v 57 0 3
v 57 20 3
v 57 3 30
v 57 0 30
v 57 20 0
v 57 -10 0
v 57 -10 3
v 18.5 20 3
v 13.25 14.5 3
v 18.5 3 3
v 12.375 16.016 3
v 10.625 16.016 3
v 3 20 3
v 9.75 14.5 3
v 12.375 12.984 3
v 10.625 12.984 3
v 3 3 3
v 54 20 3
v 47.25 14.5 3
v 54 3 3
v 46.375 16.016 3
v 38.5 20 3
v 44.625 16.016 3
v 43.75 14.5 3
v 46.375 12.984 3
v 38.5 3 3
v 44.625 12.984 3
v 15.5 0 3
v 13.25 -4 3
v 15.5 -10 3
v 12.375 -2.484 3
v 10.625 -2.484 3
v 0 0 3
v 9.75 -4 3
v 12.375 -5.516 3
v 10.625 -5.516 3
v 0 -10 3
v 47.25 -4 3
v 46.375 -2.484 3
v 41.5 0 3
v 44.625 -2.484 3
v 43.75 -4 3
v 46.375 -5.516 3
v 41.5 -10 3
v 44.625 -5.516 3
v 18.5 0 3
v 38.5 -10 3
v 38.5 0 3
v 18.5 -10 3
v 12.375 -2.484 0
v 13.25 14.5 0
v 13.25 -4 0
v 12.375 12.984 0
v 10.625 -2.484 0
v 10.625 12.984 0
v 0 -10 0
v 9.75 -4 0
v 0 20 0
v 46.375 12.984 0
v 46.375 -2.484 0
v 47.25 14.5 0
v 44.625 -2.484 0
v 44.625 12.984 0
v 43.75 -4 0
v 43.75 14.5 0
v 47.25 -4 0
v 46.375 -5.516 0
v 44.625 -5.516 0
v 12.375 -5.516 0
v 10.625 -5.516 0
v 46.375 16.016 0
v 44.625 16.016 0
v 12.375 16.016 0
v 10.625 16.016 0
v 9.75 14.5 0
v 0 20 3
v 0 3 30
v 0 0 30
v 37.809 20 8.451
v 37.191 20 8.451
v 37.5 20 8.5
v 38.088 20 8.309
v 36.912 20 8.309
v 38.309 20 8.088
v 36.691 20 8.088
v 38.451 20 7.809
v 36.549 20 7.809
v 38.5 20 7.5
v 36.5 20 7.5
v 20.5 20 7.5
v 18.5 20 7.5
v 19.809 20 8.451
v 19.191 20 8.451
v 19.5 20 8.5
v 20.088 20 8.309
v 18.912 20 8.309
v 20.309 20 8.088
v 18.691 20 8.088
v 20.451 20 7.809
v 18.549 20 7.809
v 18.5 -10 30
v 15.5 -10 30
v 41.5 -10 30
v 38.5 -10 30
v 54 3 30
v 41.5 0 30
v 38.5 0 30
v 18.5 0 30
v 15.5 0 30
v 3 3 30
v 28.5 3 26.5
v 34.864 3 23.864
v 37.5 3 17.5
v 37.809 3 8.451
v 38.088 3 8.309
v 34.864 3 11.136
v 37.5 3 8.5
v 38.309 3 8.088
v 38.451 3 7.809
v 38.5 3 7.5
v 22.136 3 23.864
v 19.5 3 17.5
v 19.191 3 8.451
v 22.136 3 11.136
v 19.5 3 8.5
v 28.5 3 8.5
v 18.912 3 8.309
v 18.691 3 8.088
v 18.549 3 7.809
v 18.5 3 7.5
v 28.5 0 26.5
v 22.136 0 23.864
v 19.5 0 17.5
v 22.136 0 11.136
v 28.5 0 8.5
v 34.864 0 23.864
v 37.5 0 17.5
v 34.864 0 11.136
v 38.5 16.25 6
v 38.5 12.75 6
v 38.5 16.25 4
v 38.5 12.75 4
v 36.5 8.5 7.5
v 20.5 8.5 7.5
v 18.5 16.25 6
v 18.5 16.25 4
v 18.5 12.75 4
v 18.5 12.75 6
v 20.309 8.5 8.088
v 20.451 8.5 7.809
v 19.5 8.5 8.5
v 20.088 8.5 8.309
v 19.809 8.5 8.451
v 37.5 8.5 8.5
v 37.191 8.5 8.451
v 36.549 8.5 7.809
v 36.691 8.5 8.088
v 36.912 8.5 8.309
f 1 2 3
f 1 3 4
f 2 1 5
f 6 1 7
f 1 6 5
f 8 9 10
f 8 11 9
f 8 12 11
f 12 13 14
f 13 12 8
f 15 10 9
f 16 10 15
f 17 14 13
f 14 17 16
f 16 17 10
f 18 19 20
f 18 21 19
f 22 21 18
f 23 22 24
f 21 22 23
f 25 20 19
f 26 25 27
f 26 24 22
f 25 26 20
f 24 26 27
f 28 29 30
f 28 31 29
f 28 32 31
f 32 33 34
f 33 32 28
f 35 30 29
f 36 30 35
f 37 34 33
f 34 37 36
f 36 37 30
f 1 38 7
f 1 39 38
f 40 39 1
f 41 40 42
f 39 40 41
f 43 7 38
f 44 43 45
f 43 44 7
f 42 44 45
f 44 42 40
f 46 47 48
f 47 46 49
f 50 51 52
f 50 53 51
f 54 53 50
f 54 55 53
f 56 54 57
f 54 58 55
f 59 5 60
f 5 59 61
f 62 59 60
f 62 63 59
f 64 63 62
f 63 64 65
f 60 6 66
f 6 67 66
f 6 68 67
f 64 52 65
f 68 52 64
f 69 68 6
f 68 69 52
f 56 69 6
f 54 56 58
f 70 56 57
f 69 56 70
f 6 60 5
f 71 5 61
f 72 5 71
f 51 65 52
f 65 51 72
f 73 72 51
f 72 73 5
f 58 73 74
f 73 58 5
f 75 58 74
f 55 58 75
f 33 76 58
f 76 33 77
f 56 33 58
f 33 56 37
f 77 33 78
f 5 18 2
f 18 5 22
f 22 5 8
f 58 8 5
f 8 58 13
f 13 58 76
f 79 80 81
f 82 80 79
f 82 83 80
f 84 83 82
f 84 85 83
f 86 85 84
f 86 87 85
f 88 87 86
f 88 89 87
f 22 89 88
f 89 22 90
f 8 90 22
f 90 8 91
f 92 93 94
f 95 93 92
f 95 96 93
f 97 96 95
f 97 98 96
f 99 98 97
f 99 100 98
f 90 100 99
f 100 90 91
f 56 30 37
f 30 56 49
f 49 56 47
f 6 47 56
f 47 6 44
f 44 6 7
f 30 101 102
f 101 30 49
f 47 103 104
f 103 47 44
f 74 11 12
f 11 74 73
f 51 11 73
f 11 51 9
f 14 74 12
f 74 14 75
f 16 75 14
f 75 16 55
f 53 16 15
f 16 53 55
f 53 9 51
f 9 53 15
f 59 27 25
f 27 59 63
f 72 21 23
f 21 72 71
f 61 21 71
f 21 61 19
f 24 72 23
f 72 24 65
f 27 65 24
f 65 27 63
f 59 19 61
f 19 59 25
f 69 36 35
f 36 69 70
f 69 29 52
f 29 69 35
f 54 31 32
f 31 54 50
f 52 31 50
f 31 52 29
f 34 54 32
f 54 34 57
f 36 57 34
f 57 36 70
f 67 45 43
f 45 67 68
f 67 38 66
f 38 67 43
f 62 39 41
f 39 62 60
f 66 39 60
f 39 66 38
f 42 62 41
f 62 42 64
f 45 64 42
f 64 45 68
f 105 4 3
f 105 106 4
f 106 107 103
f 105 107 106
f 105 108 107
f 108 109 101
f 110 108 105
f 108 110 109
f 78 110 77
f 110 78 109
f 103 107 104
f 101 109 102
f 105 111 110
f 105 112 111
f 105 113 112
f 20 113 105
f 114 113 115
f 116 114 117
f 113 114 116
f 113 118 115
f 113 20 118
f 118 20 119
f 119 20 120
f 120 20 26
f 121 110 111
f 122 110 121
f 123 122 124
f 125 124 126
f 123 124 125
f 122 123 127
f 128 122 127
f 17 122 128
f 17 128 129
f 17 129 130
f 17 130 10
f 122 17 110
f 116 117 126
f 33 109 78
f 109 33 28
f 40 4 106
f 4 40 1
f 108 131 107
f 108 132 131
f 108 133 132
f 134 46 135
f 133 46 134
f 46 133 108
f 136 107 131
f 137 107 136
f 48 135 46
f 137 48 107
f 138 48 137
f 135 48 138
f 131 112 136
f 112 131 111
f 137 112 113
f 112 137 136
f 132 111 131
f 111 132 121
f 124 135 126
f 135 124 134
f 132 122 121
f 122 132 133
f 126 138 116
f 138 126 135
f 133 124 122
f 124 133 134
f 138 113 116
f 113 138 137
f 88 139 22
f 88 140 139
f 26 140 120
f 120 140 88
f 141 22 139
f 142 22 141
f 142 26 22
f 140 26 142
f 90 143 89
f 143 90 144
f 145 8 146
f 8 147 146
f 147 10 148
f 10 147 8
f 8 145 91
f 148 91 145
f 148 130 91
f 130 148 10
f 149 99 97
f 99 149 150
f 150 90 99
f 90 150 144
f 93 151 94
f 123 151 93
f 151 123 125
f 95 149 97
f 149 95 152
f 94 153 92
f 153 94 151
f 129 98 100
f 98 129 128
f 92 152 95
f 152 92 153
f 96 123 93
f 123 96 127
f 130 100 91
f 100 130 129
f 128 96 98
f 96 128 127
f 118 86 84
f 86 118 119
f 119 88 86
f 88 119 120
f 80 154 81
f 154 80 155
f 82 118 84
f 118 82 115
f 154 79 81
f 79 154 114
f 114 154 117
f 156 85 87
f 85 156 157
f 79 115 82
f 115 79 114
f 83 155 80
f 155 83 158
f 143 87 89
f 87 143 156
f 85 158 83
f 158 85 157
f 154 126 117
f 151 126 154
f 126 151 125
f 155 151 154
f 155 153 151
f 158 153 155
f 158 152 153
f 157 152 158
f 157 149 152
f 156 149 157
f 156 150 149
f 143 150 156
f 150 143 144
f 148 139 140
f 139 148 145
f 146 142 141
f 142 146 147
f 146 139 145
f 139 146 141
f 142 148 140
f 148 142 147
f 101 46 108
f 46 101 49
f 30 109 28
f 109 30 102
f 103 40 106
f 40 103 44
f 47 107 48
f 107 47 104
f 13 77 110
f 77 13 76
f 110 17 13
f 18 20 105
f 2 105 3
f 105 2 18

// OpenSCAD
// bottom plate
difference() {
	translate([0, -10, 0]) {
		cube([57, 30, 3]);
	}
	// 3.5mm mounting holes
	translate([11.5, 14.5, 1]) {
		cylinder(h=5, d=3.5, center=true);
	}
	translate([57-11.5, 14.5, 1]) {
		cylinder(h=5, d=3.5, center=true);
	}
	translate([11.5, -4, 1]) {
		cylinder(h=5, d=3.5, center=true);
	}
	translate([57-11.5, -4, 1]) {
		cylinder(h=5, d=3.5, center=true);
	}
}
// front plate
difference() {
	cube([57,3,30]);
	// lens hole
	translate([28.5, 4, 17.5]) {
		rotate([90, 0, 0]) {
			cylinder(h=5, d=18, $fn=8);
		}
	}
}
// camera platform
difference() {
	union() {
		translate([18.5, 0, 0]) {
			cube([20, 20, 7.5]);
		}
		translate([19.5, 20, 7.5]) {
			rotate([90, 0, 0]) {
				cylinder(h=20, d=2, $fn=20);
			}
		}
		translate([37.5, 20, 7.5]) {
			rotate([90, 0, 0]) {
				cylinder(h=20, d=2, $fn=20);
			}
		}
		translate([19.5, 3, 7.5]) {
			cube([18, 5.5, 1]);
		}
	}
	// ziptie tunnel
	translate([17.5, 12.75, 4]) {
		cube([22, 3.5, 2]);
	}
}
// Lens guards
translate([15.5, -10, 0]) {
	cube([3, 10, 30]);
}
translate([38.5, -10, 0]) {
	cube([3, 10, 30]);
}
// Right-side support
polyhedron(
	points = [
		[0, 3, 3],
		[0, 3, 30],
		[0, 20, 3],

		[3, 3, 30],
		[3, 20, 3],

		[3, 3, 3]
	],
	faces = [
		[0, 2, 1],
		[1, 4, 3],
		[1, 2, 4],
		[3, 4, 5],
		[0, 1, 3],
		[0, 3, 5],
		[0, 4, 2],
		[0, 5, 4],
	]
);
// Left-side support
polyhedron(
	points = [
		[54, 3, 3],
		[54, 3, 30],
		[54, 20, 3],

		[57, 3, 30],
		[57, 20, 3],

		[57, 3, 3]
	],
	faces = [
		[0, 2, 1],
		[1, 4, 3],
		[1, 2, 4],
		[3, 4, 5],
		[0, 1, 3],
		[0, 3, 5],
		[0, 4, 2],
		[0, 5, 4],
	]
);
